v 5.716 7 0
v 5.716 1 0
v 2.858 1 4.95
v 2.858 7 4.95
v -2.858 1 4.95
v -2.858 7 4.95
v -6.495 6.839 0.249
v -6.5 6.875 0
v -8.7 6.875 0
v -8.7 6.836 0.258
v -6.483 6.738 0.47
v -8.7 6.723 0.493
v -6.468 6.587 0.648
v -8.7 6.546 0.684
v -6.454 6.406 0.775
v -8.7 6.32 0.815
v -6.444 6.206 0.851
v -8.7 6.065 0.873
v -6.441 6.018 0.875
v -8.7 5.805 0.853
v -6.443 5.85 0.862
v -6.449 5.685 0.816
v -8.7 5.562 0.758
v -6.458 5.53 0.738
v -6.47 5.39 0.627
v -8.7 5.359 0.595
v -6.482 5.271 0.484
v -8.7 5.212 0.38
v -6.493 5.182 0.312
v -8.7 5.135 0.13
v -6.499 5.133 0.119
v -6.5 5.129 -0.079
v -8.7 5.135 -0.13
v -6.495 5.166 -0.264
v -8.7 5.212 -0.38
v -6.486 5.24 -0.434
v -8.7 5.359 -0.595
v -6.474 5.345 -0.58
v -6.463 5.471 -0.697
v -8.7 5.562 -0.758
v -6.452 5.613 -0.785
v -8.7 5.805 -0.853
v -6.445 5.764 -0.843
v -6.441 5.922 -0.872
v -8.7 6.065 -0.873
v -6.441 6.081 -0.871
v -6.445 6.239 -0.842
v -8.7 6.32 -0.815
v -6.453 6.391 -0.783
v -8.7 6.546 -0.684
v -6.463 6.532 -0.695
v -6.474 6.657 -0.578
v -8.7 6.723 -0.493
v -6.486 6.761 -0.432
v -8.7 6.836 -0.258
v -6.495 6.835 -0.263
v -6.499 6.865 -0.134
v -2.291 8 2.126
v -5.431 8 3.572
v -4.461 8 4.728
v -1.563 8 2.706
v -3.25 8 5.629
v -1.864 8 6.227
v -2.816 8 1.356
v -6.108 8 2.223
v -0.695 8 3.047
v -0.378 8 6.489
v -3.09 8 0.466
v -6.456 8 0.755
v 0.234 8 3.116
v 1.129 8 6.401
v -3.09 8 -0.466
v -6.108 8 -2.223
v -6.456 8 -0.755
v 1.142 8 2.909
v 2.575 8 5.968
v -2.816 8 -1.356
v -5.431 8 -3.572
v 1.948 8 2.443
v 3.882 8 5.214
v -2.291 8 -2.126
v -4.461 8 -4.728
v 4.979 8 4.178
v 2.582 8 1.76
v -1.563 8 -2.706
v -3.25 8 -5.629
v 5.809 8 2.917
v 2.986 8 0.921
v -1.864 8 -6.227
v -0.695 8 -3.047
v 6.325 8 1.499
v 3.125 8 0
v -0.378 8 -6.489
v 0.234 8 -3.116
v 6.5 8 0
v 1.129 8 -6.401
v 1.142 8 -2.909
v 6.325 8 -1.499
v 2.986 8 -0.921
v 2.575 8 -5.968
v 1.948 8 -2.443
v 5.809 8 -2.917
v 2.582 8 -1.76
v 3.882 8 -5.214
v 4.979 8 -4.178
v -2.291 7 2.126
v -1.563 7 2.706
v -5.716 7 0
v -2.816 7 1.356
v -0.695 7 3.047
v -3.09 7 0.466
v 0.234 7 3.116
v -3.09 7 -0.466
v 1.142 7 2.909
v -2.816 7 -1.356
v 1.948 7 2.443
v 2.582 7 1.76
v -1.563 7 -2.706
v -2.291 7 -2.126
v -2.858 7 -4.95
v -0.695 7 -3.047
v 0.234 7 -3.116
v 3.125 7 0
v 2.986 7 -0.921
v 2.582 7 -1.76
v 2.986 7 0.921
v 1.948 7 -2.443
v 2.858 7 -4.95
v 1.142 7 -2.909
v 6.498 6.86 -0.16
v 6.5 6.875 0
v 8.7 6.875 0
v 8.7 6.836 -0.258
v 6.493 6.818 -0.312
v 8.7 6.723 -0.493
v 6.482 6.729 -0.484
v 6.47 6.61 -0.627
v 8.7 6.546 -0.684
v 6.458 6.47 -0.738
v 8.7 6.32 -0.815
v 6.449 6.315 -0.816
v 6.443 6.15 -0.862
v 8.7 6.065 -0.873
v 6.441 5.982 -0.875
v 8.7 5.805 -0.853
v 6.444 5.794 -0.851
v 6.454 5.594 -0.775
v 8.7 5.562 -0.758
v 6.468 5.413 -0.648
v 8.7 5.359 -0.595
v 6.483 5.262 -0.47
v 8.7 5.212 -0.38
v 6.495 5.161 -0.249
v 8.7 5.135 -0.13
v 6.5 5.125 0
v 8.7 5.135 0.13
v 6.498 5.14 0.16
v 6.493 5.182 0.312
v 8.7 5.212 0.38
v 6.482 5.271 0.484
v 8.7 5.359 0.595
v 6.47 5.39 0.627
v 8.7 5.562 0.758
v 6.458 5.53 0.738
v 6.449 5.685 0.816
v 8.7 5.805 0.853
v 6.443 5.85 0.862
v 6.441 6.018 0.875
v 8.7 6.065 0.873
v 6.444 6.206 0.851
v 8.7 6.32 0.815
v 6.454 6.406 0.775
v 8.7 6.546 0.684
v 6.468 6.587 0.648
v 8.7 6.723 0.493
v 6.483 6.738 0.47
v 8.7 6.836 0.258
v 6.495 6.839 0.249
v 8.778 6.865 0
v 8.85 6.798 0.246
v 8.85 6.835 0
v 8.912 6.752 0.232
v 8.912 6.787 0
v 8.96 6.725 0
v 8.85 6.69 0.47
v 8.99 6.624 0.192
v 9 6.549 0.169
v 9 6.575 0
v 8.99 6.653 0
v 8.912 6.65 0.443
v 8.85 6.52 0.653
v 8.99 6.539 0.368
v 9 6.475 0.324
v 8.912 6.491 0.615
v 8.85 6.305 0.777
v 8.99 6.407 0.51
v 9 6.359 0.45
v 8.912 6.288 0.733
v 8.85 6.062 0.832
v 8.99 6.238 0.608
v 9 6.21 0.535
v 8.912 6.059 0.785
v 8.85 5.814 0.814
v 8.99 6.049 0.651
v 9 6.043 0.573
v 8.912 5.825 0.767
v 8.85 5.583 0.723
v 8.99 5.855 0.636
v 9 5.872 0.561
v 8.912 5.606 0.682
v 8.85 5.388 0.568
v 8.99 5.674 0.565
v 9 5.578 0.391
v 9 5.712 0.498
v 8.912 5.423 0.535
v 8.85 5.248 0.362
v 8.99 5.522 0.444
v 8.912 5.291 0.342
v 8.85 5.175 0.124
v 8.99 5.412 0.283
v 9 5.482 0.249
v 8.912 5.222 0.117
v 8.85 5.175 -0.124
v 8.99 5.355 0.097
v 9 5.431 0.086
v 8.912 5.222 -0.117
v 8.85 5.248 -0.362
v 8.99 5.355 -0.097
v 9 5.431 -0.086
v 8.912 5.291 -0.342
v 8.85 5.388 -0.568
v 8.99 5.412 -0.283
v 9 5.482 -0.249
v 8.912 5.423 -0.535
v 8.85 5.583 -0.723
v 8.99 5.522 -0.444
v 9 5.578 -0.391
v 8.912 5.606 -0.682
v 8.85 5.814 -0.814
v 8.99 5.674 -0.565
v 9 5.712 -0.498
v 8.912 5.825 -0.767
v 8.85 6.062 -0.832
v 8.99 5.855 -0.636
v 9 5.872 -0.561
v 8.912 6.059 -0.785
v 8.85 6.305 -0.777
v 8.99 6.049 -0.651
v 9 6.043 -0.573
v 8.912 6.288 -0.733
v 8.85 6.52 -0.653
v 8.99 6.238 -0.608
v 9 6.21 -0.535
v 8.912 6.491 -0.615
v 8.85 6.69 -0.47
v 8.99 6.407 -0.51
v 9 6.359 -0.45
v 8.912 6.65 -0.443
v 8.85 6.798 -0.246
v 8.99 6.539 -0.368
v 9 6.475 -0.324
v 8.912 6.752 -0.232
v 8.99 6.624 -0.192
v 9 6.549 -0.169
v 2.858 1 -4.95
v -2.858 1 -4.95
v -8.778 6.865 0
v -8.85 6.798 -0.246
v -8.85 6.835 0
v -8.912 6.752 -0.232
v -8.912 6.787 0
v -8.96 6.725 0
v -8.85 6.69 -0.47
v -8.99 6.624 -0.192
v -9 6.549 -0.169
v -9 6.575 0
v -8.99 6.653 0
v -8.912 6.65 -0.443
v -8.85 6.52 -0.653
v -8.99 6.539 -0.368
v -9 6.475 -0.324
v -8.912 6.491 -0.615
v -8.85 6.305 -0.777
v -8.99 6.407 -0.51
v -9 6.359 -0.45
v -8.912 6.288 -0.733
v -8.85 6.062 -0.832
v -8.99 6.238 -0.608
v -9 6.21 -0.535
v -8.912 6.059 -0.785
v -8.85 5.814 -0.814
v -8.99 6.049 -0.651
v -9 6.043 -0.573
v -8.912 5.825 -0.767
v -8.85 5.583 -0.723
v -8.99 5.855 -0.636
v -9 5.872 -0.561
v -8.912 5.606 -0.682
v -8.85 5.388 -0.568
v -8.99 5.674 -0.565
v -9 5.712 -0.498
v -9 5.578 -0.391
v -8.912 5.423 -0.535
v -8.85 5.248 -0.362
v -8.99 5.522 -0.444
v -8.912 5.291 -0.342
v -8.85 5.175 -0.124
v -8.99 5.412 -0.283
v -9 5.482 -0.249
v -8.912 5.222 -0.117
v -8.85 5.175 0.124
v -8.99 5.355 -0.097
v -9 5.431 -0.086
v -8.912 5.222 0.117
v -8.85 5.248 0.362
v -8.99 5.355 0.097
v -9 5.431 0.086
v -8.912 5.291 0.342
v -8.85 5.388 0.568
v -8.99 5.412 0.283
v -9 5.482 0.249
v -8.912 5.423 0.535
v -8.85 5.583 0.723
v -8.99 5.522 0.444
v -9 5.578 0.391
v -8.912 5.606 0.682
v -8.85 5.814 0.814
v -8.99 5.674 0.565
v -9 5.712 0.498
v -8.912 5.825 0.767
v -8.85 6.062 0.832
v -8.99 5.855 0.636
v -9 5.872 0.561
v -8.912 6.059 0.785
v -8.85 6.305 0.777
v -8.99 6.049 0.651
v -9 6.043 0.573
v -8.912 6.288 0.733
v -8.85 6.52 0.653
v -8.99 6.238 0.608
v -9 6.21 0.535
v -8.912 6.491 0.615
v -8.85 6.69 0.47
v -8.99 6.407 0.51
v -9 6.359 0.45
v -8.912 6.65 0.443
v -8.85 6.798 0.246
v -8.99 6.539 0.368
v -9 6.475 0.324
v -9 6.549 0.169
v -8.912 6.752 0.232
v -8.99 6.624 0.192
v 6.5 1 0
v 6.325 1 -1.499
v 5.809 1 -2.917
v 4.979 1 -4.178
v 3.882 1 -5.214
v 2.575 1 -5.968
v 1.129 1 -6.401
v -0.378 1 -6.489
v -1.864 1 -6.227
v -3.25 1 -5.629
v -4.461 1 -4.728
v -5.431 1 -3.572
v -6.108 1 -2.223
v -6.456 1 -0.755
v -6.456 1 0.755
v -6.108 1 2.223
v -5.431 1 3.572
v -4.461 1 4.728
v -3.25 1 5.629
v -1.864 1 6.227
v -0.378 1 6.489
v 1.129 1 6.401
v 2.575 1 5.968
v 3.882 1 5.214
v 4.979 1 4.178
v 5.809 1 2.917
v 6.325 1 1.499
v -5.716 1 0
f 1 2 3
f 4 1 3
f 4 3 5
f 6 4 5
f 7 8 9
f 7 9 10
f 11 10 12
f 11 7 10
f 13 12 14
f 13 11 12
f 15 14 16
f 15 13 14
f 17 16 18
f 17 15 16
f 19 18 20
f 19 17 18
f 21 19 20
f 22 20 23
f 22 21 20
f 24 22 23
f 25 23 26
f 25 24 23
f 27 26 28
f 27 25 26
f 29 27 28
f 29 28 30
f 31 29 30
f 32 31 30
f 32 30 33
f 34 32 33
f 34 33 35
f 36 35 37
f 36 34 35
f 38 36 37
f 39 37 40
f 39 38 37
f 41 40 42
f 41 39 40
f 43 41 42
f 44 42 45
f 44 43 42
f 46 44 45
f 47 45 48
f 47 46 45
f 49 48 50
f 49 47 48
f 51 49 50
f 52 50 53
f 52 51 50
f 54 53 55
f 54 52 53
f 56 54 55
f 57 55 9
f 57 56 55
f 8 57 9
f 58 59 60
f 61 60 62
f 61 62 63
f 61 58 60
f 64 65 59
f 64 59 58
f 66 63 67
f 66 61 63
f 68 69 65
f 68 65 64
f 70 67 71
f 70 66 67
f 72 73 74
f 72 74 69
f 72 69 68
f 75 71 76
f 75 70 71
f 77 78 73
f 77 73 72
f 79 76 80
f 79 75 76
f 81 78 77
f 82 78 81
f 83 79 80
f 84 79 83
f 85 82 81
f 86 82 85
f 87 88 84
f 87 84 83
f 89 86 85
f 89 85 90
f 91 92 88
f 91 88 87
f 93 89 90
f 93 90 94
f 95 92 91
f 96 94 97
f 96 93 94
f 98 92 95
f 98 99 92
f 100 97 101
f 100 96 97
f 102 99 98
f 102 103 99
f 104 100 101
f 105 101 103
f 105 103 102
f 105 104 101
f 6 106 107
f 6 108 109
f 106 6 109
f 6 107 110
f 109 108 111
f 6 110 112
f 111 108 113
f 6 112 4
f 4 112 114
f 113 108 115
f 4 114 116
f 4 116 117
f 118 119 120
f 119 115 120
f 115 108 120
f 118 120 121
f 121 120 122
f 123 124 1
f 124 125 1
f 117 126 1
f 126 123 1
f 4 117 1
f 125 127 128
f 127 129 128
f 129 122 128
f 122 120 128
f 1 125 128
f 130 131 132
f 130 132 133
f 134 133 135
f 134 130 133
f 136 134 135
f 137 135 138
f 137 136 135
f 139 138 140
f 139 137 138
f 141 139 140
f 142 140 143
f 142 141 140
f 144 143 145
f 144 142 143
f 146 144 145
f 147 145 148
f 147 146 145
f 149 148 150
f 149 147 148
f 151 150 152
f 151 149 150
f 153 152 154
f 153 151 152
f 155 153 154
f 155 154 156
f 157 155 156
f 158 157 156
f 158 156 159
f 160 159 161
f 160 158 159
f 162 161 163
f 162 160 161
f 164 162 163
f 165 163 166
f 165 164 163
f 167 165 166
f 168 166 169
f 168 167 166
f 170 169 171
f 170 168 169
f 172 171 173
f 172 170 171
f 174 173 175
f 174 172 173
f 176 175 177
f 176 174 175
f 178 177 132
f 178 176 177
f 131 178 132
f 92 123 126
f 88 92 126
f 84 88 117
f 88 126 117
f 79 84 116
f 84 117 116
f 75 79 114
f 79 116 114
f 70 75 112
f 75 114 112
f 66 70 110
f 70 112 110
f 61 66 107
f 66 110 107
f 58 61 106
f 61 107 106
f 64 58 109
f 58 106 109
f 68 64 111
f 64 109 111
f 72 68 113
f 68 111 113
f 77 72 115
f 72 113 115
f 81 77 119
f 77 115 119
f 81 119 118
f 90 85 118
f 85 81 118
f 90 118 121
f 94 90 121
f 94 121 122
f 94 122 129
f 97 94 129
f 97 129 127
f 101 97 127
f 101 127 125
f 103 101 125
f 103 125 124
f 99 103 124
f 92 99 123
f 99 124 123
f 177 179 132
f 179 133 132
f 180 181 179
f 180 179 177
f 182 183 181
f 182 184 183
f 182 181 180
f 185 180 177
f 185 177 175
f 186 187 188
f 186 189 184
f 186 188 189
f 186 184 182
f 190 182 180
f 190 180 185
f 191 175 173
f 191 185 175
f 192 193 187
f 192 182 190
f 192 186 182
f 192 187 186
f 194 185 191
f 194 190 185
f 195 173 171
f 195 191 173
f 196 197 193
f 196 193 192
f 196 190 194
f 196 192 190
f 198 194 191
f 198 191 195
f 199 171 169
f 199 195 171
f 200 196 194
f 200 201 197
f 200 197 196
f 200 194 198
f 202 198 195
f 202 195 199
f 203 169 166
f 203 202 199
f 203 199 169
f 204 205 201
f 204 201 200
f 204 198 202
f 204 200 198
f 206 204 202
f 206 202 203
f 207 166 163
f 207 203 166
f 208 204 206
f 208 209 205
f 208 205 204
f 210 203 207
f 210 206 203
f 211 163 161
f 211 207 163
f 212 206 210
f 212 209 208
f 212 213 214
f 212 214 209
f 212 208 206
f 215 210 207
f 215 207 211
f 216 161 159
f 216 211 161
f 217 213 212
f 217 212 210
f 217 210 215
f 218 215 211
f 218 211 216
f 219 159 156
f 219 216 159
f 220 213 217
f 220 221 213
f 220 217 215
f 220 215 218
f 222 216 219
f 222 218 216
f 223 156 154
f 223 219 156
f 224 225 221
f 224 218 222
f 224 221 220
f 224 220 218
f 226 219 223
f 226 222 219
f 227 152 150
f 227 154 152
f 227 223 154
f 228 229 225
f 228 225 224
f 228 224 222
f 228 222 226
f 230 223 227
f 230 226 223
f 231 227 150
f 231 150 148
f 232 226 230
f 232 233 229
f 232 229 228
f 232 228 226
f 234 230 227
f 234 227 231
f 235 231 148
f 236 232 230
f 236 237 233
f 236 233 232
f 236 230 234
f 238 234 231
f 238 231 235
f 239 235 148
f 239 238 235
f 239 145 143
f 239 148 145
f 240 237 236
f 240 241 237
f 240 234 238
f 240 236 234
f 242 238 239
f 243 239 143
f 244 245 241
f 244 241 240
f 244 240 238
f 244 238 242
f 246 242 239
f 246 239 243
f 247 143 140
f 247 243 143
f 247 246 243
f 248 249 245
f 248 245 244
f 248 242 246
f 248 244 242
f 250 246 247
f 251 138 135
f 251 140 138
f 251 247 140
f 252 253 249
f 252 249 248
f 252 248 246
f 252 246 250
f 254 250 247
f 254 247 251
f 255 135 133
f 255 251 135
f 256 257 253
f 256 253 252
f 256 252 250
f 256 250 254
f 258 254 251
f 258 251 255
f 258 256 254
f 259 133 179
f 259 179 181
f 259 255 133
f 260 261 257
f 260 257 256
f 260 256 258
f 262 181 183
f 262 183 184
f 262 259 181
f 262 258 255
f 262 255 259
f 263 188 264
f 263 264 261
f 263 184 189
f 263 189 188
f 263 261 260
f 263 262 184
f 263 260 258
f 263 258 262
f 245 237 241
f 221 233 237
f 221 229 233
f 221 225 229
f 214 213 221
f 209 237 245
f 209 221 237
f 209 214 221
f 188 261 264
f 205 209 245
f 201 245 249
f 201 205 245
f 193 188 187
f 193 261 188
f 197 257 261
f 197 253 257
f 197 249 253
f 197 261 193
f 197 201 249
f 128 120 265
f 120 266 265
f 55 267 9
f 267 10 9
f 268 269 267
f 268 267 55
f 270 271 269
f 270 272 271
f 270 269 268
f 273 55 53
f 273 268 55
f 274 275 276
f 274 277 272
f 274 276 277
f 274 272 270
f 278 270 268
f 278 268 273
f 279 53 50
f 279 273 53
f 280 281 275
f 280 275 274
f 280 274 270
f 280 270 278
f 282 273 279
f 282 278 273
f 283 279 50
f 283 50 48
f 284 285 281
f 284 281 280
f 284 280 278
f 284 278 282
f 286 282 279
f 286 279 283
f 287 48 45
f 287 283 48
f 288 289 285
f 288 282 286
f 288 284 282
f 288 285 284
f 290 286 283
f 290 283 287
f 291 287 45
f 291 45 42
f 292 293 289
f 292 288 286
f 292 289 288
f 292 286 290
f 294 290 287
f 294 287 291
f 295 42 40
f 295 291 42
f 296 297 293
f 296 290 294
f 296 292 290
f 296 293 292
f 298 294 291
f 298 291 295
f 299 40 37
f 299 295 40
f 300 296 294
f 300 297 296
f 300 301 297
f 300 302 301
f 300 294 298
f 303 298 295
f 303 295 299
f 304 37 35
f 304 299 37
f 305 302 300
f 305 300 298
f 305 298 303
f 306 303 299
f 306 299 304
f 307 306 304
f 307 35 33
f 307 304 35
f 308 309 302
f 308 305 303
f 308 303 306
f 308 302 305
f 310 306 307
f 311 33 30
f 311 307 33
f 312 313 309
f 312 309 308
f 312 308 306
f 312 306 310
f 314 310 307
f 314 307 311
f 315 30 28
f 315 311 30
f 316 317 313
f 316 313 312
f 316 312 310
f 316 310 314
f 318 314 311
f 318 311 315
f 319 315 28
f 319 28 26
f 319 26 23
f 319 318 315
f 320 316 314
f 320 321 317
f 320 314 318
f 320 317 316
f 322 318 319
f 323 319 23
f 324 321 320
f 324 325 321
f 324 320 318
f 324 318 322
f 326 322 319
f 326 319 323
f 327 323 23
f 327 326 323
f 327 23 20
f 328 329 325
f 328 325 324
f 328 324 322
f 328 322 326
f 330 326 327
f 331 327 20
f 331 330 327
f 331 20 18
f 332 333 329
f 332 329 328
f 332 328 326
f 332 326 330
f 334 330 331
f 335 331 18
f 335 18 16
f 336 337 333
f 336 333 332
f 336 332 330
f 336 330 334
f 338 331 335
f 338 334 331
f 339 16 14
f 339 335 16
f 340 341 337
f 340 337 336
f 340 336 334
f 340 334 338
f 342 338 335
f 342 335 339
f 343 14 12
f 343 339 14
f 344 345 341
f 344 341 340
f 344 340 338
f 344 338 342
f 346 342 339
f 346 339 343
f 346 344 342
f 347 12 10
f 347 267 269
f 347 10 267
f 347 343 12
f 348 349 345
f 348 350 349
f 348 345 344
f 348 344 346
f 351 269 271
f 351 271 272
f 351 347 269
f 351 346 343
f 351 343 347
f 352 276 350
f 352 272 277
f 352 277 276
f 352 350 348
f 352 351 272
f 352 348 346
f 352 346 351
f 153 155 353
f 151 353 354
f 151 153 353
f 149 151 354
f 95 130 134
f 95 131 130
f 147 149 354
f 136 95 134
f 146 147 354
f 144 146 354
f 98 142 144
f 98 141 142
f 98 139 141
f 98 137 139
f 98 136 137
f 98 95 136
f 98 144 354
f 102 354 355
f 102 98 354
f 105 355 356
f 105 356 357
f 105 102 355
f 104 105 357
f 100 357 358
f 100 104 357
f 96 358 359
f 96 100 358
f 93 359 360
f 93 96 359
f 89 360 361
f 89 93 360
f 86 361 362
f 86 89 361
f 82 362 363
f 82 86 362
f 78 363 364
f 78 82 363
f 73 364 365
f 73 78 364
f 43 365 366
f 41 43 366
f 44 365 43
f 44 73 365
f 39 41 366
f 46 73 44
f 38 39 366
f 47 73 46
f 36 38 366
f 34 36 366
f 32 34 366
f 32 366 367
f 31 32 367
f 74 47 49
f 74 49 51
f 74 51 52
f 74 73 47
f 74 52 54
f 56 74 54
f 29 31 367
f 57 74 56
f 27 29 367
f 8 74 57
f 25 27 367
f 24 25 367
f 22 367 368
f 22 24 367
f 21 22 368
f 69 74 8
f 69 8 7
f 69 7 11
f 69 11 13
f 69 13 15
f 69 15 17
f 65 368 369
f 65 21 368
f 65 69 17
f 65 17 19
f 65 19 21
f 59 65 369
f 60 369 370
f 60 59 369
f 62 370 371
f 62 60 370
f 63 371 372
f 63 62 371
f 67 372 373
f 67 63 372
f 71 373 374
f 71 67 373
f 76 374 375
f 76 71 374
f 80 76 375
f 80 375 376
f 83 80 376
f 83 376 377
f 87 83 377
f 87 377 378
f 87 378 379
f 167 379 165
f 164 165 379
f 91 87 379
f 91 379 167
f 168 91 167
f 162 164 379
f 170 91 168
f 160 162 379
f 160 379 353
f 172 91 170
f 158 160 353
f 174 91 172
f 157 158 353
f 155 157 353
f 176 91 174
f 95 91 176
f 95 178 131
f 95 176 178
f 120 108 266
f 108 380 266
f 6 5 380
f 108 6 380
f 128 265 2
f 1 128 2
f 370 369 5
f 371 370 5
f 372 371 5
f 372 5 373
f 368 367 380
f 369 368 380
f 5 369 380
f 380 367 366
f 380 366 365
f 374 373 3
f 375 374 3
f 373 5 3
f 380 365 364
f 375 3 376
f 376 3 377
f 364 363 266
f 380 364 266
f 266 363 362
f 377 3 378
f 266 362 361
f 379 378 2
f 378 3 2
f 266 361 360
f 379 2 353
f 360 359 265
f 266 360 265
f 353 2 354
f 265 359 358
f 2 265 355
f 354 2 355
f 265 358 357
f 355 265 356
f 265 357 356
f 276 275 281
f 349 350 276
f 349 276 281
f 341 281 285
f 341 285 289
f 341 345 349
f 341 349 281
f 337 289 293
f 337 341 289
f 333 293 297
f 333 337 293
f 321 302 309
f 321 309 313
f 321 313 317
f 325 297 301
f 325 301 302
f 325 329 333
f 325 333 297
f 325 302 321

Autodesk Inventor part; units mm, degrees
ref_plane "XZ Plane" through (0, 0, 0) normal (0, 1, 0) x (-1, 0, 0)
ref_plane "XY Plane" through (0, 0, 0) normal (0, 0, 1) x (1, 0, 0)
sketch "Sketch1" plane through (0, 0, 0) normal (0, 1, 0) x (-1, 0, 0)
  circle A0 centre (0, 0) radius 9.625
  circle A1 centre (0, 0) radius 7.7
  dimension "d0" = 19.25
  dimension "d1" = 15.4
extrude "Extrusion1" add sketch "Sketch1" along normal blind 1
sketch "Sketch2" plane through (0, 1, 0) normal (0, 1, 0) x (1, 0, 0)
  circle A0 centre (0, 0) radius 9.6436
  line L0 (-2.8579, 4.95) -> (2.8579, 4.95)
  line L1 (2.8579, 4.95) -> (5.7158, 0)
  line L2 (5.7158, 0) -> (2.8579, -4.95)
  line L3 (2.8579, -4.95) -> (-2.8579, -4.95)
  line L4 (-2.8579, -4.95) -> (-5.7158, 0)
  line L5 (-5.7158, 0) -> (-2.8579, 4.95)
  line L6 (0, 0) -> (0, -3.104)
  line L7 (0, 0) -> (3.104, 0) construction
  dimension "d4" = 9.9
  dimension "d5" = 90
extrude "Extrusion2" add sketch "Sketch2" along normal blind 6
sketch "Sketch3" plane through (0, 7, 0) normal (0, 1, 0) x (1, 0, 0)
  circle A0 centre (0, 0) radius 9.6436
  circle A1 centre (0, 0) radius 3.125
  circle A2 centre (0, 0) radius 9.6436 projected
  dimension "d8" = 6.25
  dimension "d9" = 0
extrude "Extrusion3" add sketch "Sketch3" along normal blind 1
fillet "Fillet1" radius 0.2 2 edges at (9.625, 0, 0) (7.7, 0, 0)
sketch "Sketch4" plane through (0, 8, 0) normal (0, 1, 0) x (1, 0, 0)
  circle A0 centre (0, 0) radius 6.5
  circle A1 centre (0, 0) radius 9.6436 projected
  point P0 (5.2807, -5.1416)
  dimension "d15" = 13
extrude "Extrusion4" cut sketch "Sketch4" against normal through all
ref_plane "Work Plane1" through (5, 0, 0) normal (1, 0, 0) x (0, 1, 0)
sketch "Sketch5" plane through (5, 0, 0) normal (1, 0, 0) x (0, 1, 0)
  line L0 (1, 0) -> (1, 4.95) projected
  line L1 (8, 3.125) -> (8, -3.125) projected
  line L2 (7, 1.8138) -> (7, -3.5903)
  line L3 (6, 2.0921) -> (6, -3.5903)
  circle A0 centre (6, 0) radius 0.875
  point P0 (0, 0)
  dimension "d19" = 7
  dimension "d20" = 1
  dimension "d21" = 1
  dimension "d22" = 1.75
extrude "Extrusion5" add sketch "Sketch5" along normal blind 4
fillet "Fillet2" radius 0.3 1 edges at (9, 5.125, 0)
mirror "Mirror1" about plane through (0, 0, 0) normal (1, 0, 0) of "Extrusion5", "Fillet2"
sketch "Sketch6" plane through (0, 7, 0) normal (0, -1, 0) x (1, 0, 0)
  circle A0 centre (0, 0) radius 3.125 projected
  line L0 (-5.7158, 0) -> (-2.8579, -4.95) projected
  line L1 (-2.8579, -4.95) -> (2.8579, -4.95) projected
  line L2 (2.8579, -4.95) -> (5.7158, 0) projected
  line L3 (5.7158, 0) -> (2.8579, 4.95) projected
  line L4 (2.8579, 4.95) -> (-2.8579, 4.95) projected
  line L5 (-2.8579, 4.95) -> (-5.7158, 0) projected
extrude "Extrusion6" cut sketch "Sketch6" along normal through all
properties part number "NutRetainer"
